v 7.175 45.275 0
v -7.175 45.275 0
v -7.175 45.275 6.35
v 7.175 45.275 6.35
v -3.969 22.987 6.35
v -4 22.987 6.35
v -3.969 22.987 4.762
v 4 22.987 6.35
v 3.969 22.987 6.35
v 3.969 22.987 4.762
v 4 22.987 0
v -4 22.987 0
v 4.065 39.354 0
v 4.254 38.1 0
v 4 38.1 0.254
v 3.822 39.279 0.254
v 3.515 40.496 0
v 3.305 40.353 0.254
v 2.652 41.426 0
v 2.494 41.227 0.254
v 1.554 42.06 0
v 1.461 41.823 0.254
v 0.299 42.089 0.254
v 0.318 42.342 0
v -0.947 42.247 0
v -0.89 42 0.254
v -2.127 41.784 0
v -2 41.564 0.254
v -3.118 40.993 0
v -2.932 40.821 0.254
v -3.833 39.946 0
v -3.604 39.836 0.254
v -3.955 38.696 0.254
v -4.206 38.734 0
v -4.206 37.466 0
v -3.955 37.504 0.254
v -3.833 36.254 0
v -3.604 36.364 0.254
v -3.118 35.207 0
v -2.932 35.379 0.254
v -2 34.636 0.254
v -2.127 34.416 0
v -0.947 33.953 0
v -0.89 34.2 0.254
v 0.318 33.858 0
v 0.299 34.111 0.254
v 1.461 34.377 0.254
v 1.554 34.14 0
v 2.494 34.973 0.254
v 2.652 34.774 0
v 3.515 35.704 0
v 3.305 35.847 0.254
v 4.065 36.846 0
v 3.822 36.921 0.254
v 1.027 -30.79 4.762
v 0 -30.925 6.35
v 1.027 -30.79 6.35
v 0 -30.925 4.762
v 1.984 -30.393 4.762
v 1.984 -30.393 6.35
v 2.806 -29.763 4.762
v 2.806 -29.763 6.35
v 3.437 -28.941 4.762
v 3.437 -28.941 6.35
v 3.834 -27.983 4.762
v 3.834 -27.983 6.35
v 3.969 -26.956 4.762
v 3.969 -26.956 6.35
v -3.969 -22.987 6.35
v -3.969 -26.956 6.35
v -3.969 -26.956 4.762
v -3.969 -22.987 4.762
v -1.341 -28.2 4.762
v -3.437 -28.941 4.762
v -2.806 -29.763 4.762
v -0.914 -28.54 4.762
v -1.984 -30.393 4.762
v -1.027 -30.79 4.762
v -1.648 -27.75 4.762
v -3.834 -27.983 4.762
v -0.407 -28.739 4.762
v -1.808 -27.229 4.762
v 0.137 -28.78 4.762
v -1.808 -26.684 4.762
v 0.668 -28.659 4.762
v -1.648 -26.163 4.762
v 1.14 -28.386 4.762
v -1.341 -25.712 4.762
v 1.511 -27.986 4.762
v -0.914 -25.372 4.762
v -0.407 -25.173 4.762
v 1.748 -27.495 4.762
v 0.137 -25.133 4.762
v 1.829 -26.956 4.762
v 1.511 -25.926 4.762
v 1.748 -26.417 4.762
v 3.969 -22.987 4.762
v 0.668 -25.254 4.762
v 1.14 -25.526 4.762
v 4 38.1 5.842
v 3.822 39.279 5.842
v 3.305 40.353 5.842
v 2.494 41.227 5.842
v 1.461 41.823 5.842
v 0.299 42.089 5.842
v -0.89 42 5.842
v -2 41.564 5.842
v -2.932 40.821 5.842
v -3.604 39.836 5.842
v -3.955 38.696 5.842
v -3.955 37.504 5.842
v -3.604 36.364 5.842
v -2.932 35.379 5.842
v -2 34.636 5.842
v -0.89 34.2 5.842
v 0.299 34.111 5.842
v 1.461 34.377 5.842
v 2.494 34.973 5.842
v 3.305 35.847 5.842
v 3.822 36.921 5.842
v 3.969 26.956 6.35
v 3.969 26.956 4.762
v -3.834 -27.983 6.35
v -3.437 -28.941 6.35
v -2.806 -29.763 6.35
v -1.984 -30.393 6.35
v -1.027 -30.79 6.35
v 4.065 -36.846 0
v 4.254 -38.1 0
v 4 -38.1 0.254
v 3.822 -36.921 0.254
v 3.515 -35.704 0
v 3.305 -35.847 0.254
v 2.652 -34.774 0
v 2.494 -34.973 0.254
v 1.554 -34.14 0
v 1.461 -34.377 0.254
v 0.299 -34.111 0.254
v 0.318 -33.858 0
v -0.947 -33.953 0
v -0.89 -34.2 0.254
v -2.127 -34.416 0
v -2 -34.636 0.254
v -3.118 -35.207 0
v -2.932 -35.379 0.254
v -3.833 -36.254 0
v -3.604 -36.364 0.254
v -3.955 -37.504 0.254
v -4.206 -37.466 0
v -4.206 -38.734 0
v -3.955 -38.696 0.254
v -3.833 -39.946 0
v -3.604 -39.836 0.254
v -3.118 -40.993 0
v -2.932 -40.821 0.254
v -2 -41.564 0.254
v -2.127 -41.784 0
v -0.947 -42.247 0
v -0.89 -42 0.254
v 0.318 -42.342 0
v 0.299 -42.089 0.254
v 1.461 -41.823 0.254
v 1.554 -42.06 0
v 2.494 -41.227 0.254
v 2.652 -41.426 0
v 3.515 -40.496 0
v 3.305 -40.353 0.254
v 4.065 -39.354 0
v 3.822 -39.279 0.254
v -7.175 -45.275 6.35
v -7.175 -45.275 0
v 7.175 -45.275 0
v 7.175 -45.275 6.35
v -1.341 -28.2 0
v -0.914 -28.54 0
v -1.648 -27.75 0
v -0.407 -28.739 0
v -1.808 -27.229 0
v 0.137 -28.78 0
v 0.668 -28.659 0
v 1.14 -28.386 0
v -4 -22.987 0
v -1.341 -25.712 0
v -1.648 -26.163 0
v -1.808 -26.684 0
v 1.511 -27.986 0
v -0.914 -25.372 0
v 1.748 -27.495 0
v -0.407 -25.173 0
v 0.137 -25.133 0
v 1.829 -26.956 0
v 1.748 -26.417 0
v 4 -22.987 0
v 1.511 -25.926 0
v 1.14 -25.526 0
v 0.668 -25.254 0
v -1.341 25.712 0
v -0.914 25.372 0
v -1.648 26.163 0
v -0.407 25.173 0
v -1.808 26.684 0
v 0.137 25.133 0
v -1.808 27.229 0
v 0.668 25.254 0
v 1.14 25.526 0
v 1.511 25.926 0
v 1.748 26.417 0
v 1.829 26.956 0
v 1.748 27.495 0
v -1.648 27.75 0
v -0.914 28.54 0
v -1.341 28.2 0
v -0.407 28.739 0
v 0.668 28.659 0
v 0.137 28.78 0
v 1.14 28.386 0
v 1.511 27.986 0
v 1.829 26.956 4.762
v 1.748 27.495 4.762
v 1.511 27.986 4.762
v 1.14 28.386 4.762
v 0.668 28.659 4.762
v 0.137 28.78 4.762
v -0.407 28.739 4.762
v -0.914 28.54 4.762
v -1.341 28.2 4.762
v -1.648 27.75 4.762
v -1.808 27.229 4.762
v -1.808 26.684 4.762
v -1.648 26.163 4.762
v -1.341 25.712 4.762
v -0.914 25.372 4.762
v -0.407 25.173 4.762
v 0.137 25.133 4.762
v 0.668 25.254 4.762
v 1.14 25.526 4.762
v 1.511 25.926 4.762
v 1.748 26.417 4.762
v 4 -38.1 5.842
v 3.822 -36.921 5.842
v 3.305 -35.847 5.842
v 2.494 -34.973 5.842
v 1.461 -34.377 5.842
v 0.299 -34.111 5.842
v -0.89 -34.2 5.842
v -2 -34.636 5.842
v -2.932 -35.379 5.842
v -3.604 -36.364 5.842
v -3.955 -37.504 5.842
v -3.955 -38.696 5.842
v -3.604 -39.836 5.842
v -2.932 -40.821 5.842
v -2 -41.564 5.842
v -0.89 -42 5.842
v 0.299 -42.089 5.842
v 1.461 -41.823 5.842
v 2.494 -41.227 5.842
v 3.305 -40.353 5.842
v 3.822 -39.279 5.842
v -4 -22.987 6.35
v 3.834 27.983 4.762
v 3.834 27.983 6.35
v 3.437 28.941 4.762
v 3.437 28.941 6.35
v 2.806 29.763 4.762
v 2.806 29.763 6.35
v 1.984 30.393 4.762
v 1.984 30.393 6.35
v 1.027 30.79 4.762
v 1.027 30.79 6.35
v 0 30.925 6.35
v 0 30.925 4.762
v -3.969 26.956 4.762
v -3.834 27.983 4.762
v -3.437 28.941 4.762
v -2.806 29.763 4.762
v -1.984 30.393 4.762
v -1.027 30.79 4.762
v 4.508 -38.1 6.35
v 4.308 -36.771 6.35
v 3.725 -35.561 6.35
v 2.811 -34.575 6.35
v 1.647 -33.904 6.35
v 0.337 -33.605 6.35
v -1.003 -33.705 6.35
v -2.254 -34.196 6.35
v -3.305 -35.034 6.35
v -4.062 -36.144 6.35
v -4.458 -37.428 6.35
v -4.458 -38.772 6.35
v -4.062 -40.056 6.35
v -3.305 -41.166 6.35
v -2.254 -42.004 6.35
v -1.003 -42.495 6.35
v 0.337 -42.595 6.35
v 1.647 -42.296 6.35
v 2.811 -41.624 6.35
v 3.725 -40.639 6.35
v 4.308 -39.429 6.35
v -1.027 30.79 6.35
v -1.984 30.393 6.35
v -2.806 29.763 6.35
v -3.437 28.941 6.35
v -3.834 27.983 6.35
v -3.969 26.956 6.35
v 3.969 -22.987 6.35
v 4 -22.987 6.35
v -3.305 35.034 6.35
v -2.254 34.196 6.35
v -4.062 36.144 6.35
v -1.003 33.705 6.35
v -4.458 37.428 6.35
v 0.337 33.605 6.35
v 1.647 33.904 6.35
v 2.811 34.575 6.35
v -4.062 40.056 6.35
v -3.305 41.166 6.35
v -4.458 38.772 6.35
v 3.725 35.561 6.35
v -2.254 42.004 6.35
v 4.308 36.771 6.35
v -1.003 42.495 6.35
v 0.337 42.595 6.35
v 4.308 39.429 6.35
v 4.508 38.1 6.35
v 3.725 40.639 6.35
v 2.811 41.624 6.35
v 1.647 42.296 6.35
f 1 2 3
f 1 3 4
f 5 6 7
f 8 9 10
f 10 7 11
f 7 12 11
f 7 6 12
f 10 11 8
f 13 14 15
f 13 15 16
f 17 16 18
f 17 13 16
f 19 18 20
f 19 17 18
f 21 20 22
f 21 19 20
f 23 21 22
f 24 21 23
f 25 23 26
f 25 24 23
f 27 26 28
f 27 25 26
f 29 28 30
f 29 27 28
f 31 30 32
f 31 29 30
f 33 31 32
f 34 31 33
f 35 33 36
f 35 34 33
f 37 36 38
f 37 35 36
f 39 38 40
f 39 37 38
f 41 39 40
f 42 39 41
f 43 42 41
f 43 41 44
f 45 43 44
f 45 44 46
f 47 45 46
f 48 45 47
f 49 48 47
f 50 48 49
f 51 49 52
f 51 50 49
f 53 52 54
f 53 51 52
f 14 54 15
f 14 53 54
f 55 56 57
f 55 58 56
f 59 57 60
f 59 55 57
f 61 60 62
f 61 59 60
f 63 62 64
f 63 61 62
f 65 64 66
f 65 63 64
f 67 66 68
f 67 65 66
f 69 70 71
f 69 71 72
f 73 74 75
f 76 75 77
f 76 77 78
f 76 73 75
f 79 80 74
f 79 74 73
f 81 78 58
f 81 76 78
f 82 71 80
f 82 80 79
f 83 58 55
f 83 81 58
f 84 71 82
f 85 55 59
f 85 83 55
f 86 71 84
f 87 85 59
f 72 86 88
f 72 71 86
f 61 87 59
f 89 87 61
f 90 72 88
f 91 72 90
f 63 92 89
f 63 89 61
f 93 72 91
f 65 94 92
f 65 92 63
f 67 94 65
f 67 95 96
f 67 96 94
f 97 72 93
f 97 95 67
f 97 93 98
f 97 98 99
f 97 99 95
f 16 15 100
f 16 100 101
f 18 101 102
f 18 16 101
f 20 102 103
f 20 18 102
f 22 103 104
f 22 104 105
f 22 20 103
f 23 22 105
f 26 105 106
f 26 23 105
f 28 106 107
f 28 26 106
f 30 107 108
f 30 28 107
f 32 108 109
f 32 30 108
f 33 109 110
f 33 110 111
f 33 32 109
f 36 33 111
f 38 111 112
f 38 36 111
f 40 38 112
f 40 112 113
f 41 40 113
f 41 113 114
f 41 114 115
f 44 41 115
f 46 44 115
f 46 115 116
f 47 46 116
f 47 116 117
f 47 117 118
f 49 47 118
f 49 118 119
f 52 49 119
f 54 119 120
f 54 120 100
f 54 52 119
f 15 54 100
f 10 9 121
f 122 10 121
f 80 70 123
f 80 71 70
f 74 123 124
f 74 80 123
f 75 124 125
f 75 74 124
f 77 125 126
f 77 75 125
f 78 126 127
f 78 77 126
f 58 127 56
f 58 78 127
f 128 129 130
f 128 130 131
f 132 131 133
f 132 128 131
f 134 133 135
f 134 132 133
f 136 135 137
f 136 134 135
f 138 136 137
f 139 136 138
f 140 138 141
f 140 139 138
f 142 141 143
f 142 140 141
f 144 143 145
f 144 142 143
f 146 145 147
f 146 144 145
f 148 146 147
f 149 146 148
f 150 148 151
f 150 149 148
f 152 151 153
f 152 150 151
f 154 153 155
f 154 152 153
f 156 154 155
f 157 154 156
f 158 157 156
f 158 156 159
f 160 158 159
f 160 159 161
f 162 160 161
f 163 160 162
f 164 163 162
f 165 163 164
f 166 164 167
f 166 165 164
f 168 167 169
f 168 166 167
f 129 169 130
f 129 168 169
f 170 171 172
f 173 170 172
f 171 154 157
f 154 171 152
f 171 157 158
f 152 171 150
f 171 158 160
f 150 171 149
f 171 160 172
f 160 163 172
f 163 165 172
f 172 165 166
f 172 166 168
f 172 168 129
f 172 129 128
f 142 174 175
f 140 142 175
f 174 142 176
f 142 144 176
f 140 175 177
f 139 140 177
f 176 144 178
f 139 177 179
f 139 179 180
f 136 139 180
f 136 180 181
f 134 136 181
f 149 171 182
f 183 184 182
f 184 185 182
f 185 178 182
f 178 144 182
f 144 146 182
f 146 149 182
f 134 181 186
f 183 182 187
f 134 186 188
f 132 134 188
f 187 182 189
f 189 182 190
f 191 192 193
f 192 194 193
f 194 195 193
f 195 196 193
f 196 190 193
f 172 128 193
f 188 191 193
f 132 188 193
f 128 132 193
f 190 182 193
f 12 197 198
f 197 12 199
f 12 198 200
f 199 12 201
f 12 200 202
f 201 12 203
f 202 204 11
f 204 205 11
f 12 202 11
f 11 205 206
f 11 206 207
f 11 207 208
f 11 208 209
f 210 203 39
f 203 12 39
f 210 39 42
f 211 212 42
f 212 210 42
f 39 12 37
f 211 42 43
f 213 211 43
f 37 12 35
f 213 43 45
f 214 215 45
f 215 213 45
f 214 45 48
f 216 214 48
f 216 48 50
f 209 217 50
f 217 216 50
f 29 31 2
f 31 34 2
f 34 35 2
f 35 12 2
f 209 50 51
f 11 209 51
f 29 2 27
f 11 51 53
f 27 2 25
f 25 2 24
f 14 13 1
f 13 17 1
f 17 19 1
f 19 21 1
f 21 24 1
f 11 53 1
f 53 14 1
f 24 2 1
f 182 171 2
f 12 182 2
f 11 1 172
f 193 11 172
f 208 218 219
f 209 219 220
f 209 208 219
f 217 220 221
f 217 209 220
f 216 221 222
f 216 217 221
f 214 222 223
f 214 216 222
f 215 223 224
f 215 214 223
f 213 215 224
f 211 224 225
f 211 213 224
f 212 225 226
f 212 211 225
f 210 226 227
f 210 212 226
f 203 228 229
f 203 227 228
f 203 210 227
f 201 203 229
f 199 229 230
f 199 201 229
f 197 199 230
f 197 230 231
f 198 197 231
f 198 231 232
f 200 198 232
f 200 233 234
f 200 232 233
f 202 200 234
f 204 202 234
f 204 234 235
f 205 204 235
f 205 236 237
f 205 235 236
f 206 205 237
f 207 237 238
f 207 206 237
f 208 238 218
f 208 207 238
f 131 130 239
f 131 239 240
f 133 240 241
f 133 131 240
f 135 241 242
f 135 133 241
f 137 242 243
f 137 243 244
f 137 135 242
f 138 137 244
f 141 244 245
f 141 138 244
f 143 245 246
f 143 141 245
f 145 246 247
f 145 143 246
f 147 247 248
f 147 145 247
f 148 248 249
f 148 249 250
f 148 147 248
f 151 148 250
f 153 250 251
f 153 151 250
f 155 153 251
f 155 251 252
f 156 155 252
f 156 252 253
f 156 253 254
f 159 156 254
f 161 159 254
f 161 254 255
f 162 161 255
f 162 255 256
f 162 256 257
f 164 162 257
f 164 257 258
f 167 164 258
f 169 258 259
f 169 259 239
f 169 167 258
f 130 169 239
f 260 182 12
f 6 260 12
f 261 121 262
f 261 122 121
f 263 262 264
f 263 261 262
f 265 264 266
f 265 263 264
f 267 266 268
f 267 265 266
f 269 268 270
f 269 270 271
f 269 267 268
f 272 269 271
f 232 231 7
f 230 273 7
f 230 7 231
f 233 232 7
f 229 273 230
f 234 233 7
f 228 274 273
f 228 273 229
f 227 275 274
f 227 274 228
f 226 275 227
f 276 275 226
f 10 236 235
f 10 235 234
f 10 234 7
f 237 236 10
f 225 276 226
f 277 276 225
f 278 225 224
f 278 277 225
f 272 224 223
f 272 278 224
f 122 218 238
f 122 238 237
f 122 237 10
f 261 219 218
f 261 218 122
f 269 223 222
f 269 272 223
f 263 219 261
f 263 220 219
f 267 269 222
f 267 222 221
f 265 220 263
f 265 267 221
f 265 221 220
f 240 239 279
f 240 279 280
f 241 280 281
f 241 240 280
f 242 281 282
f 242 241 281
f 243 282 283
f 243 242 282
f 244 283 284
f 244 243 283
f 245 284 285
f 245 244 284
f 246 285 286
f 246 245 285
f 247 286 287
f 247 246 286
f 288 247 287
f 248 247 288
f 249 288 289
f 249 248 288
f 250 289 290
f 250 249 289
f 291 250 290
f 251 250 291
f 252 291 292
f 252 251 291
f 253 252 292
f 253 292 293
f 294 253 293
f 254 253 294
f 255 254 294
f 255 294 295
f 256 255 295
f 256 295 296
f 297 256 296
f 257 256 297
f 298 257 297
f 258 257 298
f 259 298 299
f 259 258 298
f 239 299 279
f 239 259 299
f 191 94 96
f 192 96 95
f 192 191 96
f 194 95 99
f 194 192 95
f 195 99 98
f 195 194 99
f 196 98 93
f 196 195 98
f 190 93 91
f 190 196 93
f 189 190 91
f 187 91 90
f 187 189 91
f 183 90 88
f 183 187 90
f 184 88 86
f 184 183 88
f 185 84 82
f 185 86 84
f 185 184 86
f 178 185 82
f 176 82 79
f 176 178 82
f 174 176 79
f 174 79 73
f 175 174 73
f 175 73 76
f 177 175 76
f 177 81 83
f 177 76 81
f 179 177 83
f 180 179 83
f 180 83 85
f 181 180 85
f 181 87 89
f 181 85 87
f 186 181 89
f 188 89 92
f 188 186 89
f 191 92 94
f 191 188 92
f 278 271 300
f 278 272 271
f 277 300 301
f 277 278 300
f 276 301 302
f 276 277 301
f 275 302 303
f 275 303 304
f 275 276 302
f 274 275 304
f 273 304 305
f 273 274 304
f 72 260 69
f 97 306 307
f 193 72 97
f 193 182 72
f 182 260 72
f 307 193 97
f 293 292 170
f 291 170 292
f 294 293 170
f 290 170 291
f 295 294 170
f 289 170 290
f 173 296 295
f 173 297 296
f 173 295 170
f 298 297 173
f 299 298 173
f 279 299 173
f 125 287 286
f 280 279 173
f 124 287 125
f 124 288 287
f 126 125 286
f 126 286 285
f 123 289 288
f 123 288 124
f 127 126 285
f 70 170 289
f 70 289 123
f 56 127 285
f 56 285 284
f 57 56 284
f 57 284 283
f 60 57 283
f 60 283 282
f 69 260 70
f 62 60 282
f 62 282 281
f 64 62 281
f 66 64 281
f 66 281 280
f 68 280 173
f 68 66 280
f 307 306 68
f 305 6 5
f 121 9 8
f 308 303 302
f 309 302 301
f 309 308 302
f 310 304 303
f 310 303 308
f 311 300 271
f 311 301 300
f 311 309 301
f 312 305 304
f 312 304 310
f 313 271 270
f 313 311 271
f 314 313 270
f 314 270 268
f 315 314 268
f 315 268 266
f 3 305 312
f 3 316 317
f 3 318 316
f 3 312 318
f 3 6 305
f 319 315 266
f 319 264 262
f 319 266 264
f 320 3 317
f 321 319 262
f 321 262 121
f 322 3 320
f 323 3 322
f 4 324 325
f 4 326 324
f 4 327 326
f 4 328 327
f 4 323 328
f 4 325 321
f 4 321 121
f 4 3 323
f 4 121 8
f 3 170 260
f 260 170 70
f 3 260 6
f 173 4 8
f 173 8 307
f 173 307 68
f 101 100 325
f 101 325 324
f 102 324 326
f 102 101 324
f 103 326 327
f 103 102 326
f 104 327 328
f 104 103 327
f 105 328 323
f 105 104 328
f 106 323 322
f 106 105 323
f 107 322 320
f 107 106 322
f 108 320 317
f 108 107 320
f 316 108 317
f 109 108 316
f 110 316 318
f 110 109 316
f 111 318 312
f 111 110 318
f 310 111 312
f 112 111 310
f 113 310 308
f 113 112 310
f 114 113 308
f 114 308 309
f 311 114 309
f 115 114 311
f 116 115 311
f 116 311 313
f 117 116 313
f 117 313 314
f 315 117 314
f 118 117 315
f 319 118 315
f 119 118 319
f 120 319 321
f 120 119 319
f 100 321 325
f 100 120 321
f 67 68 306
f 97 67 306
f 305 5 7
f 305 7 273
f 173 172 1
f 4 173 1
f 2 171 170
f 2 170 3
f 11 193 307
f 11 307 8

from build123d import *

# Parameters (mm, degrees)
F0_W     = 14.35
F0_H     = 90.5499906
F0_R     = 4
F0_R_2   = 1.8288
F0_W_2   = 8
F0_H_2   = 45.9749906
F1_DEPTH = 6.35
F2_SIZE  = 0.254
F3_W     = 7.9375
F3_H     = 7.9375
F4_DEPTH = 1.5875
F5_R     = 3.96874
F6_SIZE  = 0.508


# Not quite as in the source:
# - a fillet or chamfer is up to 0.001 mm smaller than in the source, because OpenCascade refuses the exact size


with BuildPart() as f1:
    # F0 (on Top) → F1 (new body)
    with BuildSketch(Plane.XY):
        Rectangle(F0_W, F0_H)
        with Locations((0, -38.0999953)):
            Circle(F0_R, mode=Mode.SUBTRACT)
        with Locations((0, -26.9562453)):
            Circle(F0_R_2, mode=Mode.SUBTRACT)
        Rectangle(F0_W_2, F0_H_2, mode=Mode.SUBTRACT)
        with Locations((0, 26.9562453)):
            Circle(F0_R_2, mode=Mode.SUBTRACT)
        with Locations((0, 38.0999953)):
            Circle(F0_R, mode=Mode.SUBTRACT)
    extrude(amount=F1_DEPTH)

    # F2
    f2_edges = [f1.edges().sort_by_distance(p)[0] for p in [
        (-4, 38.099995, 0),
        (-4, -38.099995, 0),
    ]]
    chamfer(f2_edges, length=F2_SIZE)

    # F3 (on face) → F4 (cut)
    with BuildSketch(Plane.XY.offset(6.35)):
        with Locations((0, 26.9562453)):
            Rectangle(F3_W, F3_H)
        with Locations((0, -26.9562453)):
            Rectangle(F3_W, F3_H)
    extrude(amount=-F4_DEPTH, mode=Mode.SUBTRACT)

    # F5 (radius 3.96875 in the source; OpenCascade refuses exactly that, so slightly less here)
    f5_edges = [f1.edges().sort_by_distance(p)[0] for p in [
        (-3.96875, -30.924995, 5.55625),
        (3.96875, -30.924995, 5.55625),
        (-3.96875, 30.924995, 5.55625),
        (3.96875, 30.924995, 5.55625),
    ]]
    fillet(f5_edges, radius=F5_R)

    # F6
    f6_edges = [f1.edges().sort_by_distance(p)[0] for p in [
        (-4, 38.099995, 6.35),
        (-4, -38.099995, 6.35),
    ]]
    chamfer(f6_edges, length=F6_SIZE)


solid = f1.part
